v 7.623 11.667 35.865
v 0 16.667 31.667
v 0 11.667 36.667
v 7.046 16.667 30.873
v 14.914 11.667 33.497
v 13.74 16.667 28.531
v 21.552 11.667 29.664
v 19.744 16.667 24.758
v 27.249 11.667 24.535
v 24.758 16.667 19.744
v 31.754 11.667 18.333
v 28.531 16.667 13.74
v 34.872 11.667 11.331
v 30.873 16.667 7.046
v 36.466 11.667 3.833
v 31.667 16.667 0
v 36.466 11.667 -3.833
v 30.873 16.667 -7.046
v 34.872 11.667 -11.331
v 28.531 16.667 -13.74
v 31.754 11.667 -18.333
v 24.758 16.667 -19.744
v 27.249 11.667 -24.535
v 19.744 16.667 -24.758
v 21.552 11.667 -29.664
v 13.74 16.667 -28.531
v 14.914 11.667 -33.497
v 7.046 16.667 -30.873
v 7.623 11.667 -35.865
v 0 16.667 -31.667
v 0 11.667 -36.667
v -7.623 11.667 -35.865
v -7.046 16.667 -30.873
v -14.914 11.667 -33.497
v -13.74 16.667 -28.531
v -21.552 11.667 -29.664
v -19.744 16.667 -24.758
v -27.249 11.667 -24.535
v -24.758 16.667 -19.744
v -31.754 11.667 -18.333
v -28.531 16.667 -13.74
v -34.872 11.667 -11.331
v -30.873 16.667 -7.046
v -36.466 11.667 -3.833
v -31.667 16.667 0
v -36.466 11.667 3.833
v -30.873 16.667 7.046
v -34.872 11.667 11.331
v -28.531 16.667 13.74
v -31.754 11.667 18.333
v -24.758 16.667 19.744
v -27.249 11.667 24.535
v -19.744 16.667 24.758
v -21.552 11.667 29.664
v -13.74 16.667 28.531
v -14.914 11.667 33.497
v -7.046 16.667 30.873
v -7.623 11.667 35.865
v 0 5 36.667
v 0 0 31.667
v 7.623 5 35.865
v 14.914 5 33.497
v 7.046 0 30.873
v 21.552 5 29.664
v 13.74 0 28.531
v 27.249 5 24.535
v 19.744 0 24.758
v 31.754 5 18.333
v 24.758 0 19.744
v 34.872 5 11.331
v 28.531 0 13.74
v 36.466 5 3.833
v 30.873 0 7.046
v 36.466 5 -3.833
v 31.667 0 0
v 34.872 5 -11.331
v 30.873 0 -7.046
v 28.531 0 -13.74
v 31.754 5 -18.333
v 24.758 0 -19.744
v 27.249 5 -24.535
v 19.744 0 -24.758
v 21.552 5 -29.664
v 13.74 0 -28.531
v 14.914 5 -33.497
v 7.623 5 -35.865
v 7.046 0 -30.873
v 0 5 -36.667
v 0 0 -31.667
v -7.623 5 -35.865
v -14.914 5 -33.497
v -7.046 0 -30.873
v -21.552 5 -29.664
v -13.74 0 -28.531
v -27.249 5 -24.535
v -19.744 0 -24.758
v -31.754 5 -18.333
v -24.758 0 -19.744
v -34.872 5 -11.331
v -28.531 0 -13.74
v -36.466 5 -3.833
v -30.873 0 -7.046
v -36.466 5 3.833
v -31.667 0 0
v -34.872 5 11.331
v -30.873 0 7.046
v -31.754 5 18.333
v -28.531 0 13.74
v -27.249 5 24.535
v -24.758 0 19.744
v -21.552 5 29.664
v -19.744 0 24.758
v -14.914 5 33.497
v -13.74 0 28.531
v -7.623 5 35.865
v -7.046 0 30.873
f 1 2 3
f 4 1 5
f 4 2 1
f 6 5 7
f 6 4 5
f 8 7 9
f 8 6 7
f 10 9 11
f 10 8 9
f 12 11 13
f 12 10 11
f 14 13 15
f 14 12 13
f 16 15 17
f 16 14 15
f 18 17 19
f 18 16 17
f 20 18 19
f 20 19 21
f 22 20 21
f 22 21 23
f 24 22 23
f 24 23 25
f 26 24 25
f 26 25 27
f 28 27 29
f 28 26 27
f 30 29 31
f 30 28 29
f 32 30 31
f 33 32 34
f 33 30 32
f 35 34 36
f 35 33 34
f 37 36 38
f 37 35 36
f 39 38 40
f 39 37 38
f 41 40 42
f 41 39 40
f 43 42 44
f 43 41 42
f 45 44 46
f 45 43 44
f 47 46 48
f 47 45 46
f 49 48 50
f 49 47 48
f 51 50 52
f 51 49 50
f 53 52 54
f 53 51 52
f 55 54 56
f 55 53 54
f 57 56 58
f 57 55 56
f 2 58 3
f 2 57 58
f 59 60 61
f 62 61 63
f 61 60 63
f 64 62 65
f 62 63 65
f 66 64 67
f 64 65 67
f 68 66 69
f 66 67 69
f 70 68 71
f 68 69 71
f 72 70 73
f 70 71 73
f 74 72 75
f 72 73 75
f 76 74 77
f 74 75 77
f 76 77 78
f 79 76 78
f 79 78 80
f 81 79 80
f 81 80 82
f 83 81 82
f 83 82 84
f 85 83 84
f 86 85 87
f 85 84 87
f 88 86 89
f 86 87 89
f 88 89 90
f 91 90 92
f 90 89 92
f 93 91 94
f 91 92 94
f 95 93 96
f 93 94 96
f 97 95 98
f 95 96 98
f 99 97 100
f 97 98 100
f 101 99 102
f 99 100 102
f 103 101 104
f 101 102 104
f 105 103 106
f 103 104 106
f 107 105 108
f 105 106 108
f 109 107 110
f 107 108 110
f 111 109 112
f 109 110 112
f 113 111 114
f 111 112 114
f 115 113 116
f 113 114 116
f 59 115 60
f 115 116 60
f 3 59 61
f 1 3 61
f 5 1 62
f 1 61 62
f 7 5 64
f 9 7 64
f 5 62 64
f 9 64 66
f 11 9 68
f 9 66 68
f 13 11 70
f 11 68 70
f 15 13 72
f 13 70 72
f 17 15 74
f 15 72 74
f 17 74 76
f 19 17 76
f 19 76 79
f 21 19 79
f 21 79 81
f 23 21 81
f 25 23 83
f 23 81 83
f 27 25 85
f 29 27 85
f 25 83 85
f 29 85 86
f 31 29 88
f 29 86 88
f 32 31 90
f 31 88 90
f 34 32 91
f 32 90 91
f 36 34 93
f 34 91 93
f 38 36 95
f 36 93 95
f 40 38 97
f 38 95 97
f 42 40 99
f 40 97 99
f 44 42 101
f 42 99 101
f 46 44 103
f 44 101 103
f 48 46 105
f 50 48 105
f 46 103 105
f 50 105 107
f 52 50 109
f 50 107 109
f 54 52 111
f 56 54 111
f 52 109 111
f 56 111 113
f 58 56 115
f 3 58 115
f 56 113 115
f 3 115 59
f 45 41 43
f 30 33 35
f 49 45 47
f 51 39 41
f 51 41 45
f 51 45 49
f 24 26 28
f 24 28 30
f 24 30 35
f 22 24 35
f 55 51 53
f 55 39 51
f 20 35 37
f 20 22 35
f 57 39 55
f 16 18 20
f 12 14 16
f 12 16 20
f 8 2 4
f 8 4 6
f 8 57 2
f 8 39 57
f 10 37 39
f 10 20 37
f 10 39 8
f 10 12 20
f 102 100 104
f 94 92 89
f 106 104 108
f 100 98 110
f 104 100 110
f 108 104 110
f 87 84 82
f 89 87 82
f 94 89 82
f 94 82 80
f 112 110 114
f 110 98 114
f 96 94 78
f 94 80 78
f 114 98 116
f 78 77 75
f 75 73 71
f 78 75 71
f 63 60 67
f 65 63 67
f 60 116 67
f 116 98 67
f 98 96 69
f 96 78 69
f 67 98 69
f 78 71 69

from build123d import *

# Parameters (mm, degrees)
SKETCH2_R           = 110
BOSS_EXTRUDE1_DEPTH = 50
CHAMFER1_SIZE       = 15
SCALE1_SCALE        = 0.333333333


with BuildPart() as part:
    # Sketch2 → Boss-Extrude1 (new body)
    with BuildSketch(Plane(origin=(0, 0, 0), x_dir=(1, 0, 0), z_dir=(0, 1, 0))):
        with Locations(Location((0, 0, 0), (0, 0, 270))):
            Circle(SKETCH2_R)
    extrude(amount=BOSS_EXTRUDE1_DEPTH)

    # Chamfer1
    chamfer1_edges = [part.edges().sort_by_distance(p)[0] for p in [
        (0, 0, -110),
        (0, 50, -110),
    ]]
    chamfer(chamfer1_edges, length=CHAMFER1_SIZE)


with BuildPart() as part_1:
    # Scale1: scaled about (0, 0, 0)
    add(part.part.scale(SCALE1_SCALE))


solid = part_1.part
